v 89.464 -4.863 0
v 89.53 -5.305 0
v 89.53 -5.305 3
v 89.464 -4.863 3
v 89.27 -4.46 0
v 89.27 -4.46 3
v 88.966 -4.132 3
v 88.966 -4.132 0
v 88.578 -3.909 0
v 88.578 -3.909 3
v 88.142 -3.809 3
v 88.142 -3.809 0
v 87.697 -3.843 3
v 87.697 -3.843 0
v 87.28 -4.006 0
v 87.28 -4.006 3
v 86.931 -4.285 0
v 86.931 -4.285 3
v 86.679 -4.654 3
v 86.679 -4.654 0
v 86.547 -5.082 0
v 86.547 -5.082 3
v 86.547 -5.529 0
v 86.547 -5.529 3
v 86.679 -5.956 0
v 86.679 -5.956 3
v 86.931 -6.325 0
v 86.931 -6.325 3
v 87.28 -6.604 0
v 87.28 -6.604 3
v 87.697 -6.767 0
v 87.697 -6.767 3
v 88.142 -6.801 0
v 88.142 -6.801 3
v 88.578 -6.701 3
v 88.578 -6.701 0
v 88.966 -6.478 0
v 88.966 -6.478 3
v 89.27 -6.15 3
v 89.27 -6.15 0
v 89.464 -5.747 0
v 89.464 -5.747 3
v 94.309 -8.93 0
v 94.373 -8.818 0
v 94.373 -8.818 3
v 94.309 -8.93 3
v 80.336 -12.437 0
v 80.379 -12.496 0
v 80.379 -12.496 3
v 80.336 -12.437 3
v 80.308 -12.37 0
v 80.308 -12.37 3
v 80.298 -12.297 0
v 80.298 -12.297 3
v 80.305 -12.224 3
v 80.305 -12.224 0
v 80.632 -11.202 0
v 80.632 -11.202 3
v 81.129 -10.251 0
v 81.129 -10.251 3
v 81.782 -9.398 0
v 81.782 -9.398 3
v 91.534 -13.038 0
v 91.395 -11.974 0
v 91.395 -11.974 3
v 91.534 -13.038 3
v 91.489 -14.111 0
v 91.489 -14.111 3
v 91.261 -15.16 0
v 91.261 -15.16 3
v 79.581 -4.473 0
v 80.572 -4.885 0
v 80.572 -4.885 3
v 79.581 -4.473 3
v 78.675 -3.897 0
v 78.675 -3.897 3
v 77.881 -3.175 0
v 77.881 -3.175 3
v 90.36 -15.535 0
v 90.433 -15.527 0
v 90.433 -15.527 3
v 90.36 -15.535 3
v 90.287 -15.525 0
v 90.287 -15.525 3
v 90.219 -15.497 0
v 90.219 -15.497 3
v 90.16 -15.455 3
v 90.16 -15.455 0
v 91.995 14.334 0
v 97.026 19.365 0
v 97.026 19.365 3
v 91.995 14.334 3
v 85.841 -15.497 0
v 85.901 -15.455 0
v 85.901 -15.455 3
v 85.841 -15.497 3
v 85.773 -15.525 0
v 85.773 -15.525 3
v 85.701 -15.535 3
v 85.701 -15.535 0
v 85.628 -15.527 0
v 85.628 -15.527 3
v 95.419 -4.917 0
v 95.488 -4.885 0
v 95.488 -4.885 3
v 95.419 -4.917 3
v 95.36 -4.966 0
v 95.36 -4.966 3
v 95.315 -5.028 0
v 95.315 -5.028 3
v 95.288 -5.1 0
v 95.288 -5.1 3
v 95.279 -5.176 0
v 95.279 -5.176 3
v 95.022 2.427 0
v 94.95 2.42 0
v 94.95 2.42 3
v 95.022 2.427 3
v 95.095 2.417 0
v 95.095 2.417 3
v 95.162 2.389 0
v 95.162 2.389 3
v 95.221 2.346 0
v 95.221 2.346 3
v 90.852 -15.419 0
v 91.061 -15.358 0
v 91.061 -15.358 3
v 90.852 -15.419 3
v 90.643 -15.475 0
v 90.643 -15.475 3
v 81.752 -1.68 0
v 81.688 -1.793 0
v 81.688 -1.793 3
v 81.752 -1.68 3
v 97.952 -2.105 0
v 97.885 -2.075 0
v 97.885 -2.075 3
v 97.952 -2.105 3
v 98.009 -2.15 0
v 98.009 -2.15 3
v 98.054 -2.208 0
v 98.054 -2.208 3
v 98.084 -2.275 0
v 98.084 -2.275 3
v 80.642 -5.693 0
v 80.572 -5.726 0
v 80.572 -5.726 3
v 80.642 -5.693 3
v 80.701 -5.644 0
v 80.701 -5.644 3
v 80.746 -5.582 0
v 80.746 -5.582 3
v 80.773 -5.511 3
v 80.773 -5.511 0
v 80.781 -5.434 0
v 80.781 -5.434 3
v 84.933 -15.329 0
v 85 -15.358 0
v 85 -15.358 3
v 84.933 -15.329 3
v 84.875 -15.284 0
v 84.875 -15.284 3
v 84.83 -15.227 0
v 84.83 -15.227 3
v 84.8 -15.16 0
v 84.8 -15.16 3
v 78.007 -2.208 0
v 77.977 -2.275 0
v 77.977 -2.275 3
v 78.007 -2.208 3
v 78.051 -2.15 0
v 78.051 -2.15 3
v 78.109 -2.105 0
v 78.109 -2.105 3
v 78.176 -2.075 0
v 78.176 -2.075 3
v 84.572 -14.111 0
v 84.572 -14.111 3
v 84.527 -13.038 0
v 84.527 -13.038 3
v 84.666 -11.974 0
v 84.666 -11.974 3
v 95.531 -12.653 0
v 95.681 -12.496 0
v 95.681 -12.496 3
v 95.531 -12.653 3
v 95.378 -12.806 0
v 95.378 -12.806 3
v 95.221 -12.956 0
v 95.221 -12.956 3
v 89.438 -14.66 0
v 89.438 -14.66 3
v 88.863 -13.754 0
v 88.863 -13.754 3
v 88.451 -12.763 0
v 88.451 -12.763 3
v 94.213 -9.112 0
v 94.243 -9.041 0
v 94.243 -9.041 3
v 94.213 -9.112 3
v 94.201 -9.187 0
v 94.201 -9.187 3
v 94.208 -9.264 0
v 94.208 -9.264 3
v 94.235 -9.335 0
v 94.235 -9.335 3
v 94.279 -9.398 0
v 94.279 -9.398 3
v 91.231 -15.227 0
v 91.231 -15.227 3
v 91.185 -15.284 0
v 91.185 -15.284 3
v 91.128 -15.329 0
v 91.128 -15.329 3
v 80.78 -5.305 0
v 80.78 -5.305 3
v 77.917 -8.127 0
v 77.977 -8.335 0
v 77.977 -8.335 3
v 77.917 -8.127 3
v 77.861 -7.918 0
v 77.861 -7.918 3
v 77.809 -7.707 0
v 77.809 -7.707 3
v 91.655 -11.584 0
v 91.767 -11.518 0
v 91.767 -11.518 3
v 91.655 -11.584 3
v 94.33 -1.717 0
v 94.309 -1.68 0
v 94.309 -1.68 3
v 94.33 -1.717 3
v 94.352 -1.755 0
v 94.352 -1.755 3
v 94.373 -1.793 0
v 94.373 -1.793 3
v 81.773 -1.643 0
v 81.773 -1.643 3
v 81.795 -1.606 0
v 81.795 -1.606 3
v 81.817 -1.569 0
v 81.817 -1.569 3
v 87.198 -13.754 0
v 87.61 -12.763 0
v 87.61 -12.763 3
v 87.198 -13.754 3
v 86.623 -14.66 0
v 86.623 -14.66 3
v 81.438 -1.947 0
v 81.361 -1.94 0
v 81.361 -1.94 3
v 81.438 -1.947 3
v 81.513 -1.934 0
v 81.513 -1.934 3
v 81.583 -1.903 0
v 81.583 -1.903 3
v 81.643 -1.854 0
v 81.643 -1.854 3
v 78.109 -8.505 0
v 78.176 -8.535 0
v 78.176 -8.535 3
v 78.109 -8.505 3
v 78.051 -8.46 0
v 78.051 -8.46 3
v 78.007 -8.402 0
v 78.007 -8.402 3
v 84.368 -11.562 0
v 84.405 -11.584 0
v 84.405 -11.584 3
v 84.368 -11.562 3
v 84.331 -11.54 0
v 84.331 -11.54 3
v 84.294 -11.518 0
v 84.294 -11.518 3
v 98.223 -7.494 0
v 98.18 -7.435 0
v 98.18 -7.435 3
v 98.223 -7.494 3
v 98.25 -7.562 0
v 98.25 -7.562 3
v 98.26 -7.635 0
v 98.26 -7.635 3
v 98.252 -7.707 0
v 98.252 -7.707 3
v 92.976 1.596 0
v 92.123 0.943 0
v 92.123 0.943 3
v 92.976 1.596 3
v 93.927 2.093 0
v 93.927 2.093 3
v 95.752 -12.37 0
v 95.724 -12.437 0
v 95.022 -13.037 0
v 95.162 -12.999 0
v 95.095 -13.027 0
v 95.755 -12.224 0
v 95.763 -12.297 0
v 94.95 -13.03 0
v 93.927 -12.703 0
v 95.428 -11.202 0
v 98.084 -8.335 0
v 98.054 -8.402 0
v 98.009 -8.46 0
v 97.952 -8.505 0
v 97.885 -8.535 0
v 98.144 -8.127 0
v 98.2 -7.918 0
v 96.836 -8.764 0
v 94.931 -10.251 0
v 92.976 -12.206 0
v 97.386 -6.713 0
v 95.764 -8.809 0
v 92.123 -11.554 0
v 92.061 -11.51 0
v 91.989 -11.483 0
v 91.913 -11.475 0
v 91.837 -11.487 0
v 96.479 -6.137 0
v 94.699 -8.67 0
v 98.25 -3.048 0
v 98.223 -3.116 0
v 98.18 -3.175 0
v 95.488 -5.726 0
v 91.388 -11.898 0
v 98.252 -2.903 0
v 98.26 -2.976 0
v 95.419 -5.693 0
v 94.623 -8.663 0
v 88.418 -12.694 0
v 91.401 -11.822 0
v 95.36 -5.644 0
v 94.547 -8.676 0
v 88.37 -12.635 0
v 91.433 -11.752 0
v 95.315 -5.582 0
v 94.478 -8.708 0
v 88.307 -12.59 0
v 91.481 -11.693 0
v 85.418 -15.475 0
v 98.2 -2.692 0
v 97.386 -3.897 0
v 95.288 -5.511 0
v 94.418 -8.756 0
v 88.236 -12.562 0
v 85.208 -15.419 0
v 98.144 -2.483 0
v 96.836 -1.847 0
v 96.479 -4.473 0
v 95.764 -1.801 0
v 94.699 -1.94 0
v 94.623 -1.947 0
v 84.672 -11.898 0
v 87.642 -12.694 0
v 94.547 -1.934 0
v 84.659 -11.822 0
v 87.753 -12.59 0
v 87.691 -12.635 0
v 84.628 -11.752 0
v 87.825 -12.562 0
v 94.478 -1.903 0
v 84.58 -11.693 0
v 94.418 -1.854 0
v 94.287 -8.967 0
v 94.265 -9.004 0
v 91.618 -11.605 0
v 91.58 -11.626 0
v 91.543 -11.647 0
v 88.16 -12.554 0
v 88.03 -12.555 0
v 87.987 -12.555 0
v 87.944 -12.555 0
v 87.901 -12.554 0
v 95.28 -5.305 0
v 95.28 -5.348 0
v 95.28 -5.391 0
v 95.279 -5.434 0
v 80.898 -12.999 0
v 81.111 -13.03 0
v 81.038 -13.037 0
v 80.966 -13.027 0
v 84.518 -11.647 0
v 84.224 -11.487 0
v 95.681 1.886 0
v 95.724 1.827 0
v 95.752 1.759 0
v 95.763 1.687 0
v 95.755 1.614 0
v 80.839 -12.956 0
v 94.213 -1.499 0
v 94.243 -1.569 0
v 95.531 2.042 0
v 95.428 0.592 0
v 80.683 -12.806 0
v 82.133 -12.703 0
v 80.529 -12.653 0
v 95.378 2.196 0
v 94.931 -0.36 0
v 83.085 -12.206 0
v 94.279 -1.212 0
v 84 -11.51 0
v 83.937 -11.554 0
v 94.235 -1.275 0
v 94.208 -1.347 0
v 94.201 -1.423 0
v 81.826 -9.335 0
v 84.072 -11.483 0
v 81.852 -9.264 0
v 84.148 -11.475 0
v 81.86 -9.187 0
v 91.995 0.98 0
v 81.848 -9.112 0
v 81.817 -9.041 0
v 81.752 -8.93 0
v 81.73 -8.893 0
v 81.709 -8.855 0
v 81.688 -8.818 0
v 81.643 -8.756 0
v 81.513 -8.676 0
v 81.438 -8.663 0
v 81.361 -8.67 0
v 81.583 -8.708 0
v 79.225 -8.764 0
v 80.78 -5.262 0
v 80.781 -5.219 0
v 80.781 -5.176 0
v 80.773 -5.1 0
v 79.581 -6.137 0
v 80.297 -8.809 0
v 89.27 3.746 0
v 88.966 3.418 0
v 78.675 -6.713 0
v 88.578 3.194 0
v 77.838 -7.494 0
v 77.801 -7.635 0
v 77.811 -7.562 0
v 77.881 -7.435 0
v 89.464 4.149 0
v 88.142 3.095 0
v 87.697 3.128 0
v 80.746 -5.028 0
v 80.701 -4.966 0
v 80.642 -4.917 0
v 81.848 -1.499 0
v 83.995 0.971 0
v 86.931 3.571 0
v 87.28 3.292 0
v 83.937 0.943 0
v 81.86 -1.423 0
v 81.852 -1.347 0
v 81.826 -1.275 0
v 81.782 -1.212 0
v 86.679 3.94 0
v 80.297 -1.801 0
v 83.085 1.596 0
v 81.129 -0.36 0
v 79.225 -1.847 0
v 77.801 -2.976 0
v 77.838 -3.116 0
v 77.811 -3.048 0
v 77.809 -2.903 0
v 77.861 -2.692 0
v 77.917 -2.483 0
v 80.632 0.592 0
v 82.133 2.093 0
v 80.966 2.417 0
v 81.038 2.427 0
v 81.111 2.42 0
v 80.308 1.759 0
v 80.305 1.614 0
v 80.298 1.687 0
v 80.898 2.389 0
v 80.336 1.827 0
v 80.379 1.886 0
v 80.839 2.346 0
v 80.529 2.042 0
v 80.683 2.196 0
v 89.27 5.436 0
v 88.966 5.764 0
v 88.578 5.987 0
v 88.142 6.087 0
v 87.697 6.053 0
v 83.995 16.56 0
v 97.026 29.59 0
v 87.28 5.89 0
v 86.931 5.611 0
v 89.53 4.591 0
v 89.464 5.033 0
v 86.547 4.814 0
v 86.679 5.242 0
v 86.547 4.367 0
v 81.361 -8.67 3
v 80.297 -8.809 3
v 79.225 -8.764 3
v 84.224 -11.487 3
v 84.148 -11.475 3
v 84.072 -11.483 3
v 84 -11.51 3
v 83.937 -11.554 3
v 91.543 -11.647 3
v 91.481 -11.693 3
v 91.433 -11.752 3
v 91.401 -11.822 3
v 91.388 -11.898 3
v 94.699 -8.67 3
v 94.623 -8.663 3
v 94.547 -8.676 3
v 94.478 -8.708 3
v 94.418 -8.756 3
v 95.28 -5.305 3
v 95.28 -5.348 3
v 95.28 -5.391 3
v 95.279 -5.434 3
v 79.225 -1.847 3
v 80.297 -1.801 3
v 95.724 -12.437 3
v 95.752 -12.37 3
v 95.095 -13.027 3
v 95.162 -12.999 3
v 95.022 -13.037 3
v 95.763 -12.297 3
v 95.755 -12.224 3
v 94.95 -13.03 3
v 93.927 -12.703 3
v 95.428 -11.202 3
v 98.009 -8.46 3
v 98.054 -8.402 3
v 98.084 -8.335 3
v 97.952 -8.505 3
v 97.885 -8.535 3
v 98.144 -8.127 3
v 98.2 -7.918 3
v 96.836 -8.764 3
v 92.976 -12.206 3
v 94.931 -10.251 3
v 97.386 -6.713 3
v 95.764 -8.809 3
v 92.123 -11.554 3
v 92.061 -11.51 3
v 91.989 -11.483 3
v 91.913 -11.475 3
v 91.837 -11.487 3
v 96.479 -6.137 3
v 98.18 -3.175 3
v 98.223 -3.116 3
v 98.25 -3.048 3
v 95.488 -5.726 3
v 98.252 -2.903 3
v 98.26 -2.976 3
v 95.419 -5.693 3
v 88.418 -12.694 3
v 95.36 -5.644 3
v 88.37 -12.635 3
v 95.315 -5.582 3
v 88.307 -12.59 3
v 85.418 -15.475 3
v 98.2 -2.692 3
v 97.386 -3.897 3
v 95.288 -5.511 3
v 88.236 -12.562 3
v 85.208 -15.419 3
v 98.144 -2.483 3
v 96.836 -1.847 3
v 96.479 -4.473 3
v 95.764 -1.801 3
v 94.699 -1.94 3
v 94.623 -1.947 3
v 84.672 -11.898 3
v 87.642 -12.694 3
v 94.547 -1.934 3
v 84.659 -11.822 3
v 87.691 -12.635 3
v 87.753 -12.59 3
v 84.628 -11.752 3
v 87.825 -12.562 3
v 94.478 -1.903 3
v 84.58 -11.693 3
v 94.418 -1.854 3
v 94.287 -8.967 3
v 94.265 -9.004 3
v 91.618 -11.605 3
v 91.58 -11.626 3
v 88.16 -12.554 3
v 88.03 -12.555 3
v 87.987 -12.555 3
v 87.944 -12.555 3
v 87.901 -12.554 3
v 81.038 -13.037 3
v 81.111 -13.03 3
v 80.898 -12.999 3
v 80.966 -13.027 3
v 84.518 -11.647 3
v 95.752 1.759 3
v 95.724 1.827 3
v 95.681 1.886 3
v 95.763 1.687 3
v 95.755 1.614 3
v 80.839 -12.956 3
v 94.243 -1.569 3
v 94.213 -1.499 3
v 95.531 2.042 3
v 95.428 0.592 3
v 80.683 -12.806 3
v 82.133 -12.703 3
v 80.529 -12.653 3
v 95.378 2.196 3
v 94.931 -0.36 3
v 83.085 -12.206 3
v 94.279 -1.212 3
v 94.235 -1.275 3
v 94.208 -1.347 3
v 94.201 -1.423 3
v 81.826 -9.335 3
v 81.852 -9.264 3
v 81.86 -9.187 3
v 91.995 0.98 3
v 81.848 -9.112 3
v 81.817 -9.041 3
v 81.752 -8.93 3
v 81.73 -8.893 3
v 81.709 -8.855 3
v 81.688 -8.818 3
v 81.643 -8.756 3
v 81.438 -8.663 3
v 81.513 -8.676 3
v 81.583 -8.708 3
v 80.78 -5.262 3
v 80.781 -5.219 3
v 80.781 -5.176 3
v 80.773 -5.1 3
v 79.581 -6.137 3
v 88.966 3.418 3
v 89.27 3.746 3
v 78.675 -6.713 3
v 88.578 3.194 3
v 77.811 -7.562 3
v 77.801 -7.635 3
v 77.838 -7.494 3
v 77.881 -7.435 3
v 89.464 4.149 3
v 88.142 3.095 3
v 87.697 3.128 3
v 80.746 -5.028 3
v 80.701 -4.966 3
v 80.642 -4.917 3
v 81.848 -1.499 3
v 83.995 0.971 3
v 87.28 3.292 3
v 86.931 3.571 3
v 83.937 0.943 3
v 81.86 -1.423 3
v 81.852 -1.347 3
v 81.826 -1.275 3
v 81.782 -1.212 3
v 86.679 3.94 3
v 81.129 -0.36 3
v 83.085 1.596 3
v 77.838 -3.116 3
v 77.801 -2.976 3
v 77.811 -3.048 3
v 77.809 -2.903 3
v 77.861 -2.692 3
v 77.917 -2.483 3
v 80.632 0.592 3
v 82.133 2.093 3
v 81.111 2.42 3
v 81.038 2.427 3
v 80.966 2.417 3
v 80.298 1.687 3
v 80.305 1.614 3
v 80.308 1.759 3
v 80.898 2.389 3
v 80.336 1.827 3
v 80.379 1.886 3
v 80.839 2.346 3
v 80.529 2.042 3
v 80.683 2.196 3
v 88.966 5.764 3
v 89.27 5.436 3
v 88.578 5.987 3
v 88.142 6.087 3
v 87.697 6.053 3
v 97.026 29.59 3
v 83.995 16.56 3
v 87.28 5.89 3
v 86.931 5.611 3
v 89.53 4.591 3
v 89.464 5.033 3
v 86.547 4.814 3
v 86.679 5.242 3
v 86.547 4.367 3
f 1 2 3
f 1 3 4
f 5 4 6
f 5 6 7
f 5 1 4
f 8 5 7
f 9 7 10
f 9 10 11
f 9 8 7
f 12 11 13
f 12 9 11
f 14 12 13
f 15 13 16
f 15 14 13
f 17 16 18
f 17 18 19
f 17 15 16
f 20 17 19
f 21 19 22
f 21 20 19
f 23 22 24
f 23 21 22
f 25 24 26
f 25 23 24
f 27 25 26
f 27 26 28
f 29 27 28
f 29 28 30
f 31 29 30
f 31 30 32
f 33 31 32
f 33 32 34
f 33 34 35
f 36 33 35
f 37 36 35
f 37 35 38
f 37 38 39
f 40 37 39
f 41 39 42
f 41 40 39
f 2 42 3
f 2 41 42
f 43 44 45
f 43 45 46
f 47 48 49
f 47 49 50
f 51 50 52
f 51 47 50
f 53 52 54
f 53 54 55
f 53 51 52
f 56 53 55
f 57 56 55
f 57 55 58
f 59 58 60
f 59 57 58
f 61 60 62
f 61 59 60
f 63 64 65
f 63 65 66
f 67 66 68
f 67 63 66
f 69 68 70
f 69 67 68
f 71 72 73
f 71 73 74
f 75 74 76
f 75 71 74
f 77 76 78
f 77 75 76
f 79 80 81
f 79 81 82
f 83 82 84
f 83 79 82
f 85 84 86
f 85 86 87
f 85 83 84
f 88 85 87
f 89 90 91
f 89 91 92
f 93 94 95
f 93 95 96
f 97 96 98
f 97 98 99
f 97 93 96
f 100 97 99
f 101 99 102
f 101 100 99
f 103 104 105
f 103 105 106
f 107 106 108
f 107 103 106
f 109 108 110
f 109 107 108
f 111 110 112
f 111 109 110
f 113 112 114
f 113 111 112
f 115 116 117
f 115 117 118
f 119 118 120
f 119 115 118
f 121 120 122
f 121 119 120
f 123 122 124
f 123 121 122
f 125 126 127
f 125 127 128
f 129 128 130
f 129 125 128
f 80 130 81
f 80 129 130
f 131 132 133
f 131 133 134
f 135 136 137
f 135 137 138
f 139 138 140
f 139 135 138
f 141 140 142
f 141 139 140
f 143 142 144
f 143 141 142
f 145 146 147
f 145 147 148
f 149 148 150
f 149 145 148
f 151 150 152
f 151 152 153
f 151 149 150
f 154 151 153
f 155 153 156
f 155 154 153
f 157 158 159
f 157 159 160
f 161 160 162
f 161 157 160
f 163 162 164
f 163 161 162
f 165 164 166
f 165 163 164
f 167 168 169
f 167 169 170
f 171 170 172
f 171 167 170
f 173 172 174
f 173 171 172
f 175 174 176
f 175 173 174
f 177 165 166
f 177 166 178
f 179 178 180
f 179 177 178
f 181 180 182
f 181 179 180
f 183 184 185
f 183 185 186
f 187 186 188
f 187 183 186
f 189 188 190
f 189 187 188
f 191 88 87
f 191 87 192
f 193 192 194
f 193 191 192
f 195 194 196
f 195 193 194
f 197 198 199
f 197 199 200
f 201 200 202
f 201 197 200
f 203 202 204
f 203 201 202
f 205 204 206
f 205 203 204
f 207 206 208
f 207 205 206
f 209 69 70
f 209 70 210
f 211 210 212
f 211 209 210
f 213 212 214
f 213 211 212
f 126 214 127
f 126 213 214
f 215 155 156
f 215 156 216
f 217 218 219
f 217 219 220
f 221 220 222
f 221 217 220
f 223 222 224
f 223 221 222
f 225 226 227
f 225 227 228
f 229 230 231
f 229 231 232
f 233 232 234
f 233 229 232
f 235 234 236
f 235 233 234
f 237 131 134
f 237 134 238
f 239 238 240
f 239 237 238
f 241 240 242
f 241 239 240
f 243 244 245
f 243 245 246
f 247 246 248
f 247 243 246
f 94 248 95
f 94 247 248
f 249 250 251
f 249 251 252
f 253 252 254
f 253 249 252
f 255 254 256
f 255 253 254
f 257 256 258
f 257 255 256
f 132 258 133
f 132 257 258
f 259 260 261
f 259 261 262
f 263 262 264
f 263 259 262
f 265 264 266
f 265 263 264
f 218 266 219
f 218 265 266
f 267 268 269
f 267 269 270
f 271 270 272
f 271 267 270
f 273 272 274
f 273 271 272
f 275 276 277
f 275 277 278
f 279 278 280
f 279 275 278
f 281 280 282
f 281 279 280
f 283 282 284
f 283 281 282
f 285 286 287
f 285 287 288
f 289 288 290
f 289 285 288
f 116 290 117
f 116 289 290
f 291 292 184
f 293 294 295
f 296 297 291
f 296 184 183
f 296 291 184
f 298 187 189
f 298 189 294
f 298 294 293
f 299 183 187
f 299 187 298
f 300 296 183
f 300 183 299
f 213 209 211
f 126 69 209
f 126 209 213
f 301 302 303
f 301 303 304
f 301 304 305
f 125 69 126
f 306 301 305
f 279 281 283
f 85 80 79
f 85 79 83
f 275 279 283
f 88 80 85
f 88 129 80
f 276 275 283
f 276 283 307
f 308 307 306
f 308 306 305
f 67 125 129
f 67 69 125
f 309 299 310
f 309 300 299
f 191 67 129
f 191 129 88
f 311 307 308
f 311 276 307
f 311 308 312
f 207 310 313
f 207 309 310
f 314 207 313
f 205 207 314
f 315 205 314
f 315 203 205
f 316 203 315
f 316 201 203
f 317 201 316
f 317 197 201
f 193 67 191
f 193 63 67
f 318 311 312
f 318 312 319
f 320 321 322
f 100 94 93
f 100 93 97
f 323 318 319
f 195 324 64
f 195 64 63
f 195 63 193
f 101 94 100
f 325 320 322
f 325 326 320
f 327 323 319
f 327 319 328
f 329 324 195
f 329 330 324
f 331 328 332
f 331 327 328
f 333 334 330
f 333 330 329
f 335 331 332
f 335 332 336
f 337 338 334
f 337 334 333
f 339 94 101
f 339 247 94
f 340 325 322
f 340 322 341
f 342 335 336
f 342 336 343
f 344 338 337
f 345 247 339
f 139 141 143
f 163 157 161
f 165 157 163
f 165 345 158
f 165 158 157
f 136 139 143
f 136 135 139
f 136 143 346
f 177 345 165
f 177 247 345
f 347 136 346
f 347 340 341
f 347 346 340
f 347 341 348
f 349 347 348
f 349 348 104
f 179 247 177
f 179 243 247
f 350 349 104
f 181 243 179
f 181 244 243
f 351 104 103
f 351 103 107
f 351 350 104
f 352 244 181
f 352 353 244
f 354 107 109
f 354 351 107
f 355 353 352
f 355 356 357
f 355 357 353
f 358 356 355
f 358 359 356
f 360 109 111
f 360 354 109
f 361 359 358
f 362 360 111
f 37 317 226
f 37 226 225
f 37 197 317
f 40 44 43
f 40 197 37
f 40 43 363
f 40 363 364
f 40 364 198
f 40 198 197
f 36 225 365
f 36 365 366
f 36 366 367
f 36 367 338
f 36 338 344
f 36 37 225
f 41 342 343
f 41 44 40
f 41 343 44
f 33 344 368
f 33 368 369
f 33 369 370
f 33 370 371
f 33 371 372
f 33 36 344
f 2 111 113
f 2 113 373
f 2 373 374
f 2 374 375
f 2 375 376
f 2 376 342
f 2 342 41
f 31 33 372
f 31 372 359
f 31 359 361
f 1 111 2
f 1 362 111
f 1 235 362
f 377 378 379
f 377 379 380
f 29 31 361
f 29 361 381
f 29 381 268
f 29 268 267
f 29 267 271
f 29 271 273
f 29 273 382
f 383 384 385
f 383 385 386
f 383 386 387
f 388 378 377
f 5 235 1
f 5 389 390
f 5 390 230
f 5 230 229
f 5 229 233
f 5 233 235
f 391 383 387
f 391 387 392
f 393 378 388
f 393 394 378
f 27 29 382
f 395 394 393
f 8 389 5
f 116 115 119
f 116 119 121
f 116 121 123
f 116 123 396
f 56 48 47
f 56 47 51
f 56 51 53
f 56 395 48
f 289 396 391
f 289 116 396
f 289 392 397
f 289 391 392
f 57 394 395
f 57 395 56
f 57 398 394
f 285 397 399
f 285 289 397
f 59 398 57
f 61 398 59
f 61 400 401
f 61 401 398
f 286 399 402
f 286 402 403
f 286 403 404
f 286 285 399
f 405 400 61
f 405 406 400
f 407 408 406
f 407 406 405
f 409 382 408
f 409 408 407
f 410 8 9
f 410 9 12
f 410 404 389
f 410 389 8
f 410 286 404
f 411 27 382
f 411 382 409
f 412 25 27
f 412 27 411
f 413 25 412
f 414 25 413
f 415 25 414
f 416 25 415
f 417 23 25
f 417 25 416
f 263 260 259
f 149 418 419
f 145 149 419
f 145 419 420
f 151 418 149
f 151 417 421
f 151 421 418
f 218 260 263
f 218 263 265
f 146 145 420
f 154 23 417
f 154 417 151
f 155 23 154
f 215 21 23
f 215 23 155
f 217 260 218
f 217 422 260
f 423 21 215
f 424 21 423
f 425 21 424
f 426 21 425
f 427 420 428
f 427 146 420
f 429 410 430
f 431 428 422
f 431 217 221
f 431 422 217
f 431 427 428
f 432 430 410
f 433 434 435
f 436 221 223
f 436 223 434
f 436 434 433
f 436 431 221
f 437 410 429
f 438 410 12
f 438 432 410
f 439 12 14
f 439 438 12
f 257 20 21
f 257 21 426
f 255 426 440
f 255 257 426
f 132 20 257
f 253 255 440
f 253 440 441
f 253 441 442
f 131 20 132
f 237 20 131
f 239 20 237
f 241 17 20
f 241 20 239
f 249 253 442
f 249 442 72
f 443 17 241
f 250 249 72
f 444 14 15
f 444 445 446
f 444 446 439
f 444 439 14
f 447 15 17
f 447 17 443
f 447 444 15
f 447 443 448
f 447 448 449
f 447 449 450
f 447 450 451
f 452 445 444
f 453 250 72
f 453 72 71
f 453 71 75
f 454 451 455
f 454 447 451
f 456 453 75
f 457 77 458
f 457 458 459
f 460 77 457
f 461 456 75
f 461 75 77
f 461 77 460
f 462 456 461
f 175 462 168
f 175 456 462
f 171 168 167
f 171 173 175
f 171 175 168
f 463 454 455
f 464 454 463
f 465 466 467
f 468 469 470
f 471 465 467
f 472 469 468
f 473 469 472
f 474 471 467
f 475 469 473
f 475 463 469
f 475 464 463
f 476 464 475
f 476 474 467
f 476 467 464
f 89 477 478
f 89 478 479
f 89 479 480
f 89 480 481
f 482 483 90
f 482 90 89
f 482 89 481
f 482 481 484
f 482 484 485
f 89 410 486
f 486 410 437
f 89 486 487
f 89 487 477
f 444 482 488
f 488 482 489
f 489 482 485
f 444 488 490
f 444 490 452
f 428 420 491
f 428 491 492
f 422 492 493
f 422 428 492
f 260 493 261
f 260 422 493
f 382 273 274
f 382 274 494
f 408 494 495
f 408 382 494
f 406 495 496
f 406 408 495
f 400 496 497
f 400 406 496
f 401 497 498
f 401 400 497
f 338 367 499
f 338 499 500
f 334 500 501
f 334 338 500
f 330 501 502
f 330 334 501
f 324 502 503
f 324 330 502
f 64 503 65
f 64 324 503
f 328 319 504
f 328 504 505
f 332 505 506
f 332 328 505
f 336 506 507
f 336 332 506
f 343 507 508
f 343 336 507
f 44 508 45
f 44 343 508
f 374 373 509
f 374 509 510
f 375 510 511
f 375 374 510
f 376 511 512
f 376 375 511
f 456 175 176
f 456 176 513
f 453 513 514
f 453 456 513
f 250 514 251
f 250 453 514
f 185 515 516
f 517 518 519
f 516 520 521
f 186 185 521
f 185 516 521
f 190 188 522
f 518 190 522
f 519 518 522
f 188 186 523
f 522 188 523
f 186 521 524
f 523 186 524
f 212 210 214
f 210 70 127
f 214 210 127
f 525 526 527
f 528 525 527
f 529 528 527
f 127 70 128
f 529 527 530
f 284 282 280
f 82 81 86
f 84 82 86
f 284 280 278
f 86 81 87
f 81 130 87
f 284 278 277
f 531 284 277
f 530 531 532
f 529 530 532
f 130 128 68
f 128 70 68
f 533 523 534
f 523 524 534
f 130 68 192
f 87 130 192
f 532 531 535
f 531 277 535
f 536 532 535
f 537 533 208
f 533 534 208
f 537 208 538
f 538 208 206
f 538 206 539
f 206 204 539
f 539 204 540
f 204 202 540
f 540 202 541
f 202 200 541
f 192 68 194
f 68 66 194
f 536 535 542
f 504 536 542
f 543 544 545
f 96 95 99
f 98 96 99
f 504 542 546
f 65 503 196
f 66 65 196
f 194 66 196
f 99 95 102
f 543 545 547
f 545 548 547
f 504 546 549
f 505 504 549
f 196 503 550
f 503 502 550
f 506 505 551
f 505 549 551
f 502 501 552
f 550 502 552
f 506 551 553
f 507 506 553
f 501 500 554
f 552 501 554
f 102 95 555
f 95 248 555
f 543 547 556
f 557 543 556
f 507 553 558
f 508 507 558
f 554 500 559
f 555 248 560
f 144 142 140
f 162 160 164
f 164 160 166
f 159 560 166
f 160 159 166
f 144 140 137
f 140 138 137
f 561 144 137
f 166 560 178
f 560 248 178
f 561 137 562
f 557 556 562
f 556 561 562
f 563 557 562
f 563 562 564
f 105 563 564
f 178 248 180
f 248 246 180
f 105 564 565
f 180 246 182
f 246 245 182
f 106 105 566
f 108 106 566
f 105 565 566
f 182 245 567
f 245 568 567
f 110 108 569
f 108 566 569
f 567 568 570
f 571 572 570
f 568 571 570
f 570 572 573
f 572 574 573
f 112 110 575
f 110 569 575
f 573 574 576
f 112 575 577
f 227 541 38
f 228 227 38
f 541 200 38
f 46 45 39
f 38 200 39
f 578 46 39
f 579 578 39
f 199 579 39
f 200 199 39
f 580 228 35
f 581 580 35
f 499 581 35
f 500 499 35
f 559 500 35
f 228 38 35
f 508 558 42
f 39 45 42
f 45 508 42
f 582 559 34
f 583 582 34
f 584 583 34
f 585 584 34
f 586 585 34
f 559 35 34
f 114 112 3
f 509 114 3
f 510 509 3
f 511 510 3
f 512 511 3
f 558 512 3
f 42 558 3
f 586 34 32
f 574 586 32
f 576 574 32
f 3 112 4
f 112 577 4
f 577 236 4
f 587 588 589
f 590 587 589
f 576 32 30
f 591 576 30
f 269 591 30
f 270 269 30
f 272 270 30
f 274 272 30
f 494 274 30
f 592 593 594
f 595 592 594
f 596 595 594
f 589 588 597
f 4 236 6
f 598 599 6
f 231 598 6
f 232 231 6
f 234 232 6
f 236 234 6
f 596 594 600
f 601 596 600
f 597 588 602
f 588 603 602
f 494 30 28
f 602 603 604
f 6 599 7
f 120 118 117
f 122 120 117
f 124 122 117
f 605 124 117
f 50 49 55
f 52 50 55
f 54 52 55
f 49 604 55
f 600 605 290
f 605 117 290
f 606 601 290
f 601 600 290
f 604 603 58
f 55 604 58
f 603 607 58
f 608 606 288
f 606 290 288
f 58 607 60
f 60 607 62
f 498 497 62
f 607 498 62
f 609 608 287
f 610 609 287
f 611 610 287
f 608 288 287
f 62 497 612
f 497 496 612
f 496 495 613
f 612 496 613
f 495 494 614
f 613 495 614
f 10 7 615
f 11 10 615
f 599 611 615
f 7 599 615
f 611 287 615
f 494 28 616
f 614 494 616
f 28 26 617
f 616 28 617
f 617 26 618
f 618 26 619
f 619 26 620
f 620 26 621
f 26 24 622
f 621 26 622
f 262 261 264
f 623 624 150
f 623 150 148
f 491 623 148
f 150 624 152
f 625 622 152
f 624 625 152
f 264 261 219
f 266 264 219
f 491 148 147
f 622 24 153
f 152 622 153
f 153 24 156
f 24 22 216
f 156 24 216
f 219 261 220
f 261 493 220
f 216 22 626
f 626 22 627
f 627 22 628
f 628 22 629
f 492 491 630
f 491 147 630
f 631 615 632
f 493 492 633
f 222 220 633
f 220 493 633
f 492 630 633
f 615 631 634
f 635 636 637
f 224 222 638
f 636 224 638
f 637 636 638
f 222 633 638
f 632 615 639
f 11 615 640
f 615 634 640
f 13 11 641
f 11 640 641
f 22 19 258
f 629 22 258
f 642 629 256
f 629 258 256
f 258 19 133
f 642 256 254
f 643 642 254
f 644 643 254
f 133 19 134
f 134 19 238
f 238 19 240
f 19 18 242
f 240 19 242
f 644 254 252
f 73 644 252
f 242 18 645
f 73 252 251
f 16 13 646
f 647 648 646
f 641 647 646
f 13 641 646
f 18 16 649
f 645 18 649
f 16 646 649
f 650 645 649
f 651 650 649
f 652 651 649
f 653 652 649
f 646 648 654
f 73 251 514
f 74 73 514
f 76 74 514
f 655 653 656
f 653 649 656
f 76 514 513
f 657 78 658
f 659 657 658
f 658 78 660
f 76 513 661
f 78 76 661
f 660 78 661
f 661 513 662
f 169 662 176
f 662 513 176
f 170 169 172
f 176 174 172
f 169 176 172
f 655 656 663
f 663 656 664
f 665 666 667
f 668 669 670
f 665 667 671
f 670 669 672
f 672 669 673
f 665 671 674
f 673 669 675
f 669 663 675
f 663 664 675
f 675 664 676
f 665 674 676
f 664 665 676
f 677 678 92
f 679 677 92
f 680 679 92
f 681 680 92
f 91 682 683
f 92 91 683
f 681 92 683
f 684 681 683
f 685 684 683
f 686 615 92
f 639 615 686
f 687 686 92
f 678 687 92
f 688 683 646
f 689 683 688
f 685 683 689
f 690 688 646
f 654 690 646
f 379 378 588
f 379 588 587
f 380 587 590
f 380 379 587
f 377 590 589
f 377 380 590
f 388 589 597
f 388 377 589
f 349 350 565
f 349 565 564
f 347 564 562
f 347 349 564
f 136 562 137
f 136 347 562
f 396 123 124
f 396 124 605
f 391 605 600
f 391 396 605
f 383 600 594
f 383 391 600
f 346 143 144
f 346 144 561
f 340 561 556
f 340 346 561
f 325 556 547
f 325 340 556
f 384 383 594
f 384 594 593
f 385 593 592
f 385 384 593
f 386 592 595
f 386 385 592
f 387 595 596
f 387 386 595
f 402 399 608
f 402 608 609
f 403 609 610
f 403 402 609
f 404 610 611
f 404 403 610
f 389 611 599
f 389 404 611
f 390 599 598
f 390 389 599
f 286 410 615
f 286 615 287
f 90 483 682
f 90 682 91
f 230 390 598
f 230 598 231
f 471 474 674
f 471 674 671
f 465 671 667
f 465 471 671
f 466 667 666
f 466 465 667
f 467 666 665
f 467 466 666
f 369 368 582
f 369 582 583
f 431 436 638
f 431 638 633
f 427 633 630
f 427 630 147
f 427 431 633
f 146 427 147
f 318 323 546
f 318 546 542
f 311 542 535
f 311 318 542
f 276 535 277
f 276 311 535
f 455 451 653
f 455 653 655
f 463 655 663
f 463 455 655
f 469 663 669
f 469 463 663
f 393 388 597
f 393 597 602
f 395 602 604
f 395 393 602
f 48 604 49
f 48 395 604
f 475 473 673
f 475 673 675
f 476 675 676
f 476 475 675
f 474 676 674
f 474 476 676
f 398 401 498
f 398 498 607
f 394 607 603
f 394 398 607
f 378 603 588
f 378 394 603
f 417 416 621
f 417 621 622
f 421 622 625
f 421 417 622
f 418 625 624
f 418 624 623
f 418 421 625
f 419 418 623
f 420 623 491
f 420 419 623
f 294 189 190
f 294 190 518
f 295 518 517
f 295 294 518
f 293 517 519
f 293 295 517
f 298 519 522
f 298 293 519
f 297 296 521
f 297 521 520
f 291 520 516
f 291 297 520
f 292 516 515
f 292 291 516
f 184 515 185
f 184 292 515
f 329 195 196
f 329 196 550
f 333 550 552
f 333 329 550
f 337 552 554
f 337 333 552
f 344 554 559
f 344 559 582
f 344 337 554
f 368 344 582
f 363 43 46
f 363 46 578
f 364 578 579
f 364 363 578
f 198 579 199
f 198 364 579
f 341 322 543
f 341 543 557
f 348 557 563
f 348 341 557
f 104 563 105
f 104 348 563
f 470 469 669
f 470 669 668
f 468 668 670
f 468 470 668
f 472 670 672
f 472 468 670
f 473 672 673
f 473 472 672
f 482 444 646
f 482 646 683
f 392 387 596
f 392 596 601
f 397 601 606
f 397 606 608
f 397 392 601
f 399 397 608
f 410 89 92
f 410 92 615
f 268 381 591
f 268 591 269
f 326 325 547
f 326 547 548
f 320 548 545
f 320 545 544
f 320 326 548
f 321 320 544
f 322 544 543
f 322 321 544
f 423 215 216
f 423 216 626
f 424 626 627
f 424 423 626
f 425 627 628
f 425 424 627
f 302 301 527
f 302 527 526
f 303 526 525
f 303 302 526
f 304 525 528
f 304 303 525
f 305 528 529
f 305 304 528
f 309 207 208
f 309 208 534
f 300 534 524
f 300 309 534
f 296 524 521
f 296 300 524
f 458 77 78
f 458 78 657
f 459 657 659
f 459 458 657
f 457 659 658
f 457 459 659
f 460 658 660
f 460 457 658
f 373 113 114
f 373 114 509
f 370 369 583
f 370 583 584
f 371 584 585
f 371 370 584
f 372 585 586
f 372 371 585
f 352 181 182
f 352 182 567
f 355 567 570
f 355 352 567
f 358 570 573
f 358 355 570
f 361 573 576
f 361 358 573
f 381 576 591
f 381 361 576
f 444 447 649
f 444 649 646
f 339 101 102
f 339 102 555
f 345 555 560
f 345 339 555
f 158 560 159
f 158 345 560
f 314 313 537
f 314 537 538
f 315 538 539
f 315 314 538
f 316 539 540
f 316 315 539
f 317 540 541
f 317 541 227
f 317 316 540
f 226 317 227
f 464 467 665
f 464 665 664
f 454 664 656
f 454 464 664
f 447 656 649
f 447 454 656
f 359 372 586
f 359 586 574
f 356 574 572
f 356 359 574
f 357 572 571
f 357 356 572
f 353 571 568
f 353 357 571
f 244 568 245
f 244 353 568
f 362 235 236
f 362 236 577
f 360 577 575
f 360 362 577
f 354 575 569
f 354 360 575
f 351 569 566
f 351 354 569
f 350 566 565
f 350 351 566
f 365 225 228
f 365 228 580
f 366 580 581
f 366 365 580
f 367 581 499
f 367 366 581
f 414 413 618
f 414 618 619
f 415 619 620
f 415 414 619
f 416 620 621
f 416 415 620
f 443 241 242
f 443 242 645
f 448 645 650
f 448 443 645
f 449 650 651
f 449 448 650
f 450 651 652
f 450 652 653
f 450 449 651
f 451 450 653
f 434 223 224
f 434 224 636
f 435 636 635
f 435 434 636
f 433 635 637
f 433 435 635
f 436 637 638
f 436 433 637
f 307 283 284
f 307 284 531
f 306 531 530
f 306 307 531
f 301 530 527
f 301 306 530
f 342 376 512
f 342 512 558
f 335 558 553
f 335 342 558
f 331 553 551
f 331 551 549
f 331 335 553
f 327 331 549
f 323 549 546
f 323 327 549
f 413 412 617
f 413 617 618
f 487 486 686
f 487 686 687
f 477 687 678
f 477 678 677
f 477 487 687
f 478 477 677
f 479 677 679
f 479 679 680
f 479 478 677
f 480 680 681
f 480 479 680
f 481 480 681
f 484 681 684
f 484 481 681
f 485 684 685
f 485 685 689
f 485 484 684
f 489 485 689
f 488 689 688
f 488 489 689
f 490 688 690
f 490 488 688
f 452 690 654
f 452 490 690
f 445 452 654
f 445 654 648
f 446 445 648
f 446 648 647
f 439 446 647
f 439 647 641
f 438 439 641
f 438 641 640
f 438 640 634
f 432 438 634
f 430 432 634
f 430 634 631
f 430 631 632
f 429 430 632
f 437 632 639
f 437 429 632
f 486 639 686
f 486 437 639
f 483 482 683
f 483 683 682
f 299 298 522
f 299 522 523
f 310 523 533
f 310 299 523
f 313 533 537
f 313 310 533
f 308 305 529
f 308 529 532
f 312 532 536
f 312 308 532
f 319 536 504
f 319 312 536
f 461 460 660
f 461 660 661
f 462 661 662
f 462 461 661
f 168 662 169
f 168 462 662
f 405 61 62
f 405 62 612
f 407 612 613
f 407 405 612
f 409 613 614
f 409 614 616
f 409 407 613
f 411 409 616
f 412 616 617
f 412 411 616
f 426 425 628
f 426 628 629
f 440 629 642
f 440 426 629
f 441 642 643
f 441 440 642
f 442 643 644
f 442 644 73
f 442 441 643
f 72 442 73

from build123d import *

# Parameters (mm, degrees)
ESQUISSE18_R        = 1.5
BOSS_EXTRU_18_DEPTH = 3


with BuildPart() as part:
    # Esquisse18 → Boss.-Extru.18 (new body)
    with BuildSketch(Plane.XY):
        with BuildLine():
            Line((83.995271076, 16.559954608), (97.025632531, 29.590316063))
            Line((97.025632531, 29.590316063), (97.025632531, 19.364814746))
            Line((97.025632531, 19.364814746), (91.995271076, 14.334453291))
            Line((91.995271076, 14.334453291), (91.995271076, 0.979857371))
            Line((91.995271076, 0.979857371), (92.123404239, 0.943388643))
            ThreePointArc((92.123404239, 0.943388643), (93.440738996, 1.864842376), (94.949542599, 2.419783395))
            ThreePointArc((94.949542599, 2.419783395), (95.094740148, 2.416733928), (95.221491727, 2.345842004))
            ThreePointArc((95.221491727, 2.345842004), (95.454932198, 2.119520802), (95.6812534, 1.886080331))
            ThreePointArc((95.6812534, 1.886080331), (95.752145324, 1.759328753), (95.755194791, 1.614131203))
            ThreePointArc((95.755194791, 1.614131203), (95.200253772, 0.1053276), (94.278800038, -1.212007157))
            ThreePointArc((94.278800038, -1.212007157), (94.201940613, -1.384508915), (94.243380312, -1.568755975))
            Line((94.243380312, -1.568755975), (94.308995173, -1.680100401))
            ThreePointArc((94.308995173, -1.680100401), (94.341055685, -1.73620681), (94.372614843, -1.792596749))
            ThreePointArc((94.372614843, -1.792596749), (94.511457628, -1.920608112), (94.699278246, -1.940296776))
            ThreePointArc((94.699278246, -1.940296776), (96.300850478, -1.800961813), (97.884983236, -2.074770594))
            ThreePointArc((97.884983236, -2.074770594), (98.009203269, -2.150010285), (98.083527395, -2.274780281))
            ThreePointArc((98.083527395, -2.274780281), (98.172532171, -2.587500427), (98.251811846, -2.902826406))
            ThreePointArc((98.251811846, -2.902826406), (98.249830264, -3.048042455), (98.179872405, -3.175311955))
            ThreePointArc((98.179872405, -3.175311955), (96.944877584, -4.204503695), (95.488207864, -4.884622193))
            ThreePointArc((95.488207864, -4.884622193), (95.33539477, -4.995583385), (95.279159072, -5.175865869))
            Line((95.279159072, -5.175865869), (95.280310995, -5.305100401))
            ThreePointArc((95.280310995, -5.305100401), (95.280023009, -5.369720233), (95.279159072, -5.434334932))
            ThreePointArc((95.279159072, -5.434334932), (95.33539477, -5.614617416), (95.488207864, -5.725578608))
            ThreePointArc((95.488207864, -5.725578608), (96.944877584, -6.405697106), (98.179872405, -7.434888846))
            ThreePointArc((98.179872405, -7.434888846), (98.249830264, -7.562158346), (98.251811846, -7.707374395))
            ThreePointArc((98.251811846, -7.707374395), (98.172532171, -8.022700374), (98.083527395, -8.33542052))
            ThreePointArc((98.083527395, -8.33542052), (98.009203269, -8.460190516), (97.884983236, -8.535430207))
            ThreePointArc((97.884983236, -8.535430207), (96.300850478, -8.809238989), (94.699278246, -8.669904025))
            ThreePointArc((94.699278246, -8.669904025), (94.511457628, -8.68959269), (94.372614843, -8.817604052))
            Line((94.372614843, -8.817604052), (94.308995173, -8.930100401))
            ThreePointArc((94.308995173, -8.930100401), (94.276435853, -8.985918824), (94.243380312, -9.041444826))
            ThreePointArc((94.243380312, -9.041444826), (94.201940613, -9.225691886), (94.278800038, -9.398193644))
            ThreePointArc((94.278800038, -9.398193644), (95.200253772, -10.715528401), (95.755194791, -12.224332004))
            ThreePointArc((95.755194791, -12.224332004), (95.752145324, -12.369529554), (95.6812534, -12.496281132))
            ThreePointArc((95.6812534, -12.496281132), (95.454932198, -12.729721603), (95.221491727, -12.956042805))
            ThreePointArc((95.221491727, -12.956042805), (95.094740148, -13.026934729), (94.949542599, -13.029984196))
            ThreePointArc((94.949542599, -13.029984196), (93.440738996, -12.475043177), (92.123404239, -11.553589444))
            ThreePointArc((92.123404239, -11.553589444), (91.950902481, -11.476730018), (91.76665542, -11.518169717))
            Line((91.76665542, -11.518169717), (91.655310995, -11.583784578))
            ThreePointArc((91.655310995, -11.583784578), (91.599204585, -11.61584509), (91.542814646, -11.647404249))
            ThreePointArc((91.542814646, -11.647404249), (91.414803284, -11.786247034), (91.39511462, -11.974067651))
            ThreePointArc((91.39511462, -11.974067651), (91.534449583, -13.575639883), (91.260640801, -15.159772642))
            ThreePointArc((91.260640801, -15.159772642), (91.185401111, -15.283992675), (91.060631115, -15.3583168))
            ThreePointArc((91.060631115, -15.3583168), (90.747910969, -15.447321577), (90.43258499, -15.526601252))
            ThreePointArc((90.43258499, -15.526601252), (90.287368941, -15.52461967), (90.160099441, -15.454661811))
            ThreePointArc((90.160099441, -15.454661811), (89.130907701, -14.219666989), (88.450789203, -12.762997269))
            ThreePointArc((88.450789203, -12.762997269), (88.339828011, -12.610184175), (88.159545526, -12.553948477))
            Line((88.159545526, -12.553948477), (88.030310995, -12.555100401))
            ThreePointArc((88.030310995, -12.555100401), (87.965691163, -12.554812414), (87.901076464, -12.553948477))
            ThreePointArc((87.901076464, -12.553948477), (87.72079398, -12.610184175), (87.609832788, -12.762997269))
            ThreePointArc((87.609832788, -12.762997269), (86.929714289, -14.219666989), (85.900522549, -15.454661811))
            ThreePointArc((85.900522549, -15.454661811), (85.77325305, -15.52461967), (85.628037, -15.526601252))
            ThreePointArc((85.628037, -15.526601252), (85.312711022, -15.447321577), (84.999990876, -15.3583168))
            ThreePointArc((84.999990876, -15.3583168), (84.875220879, -15.283992675), (84.799981189, -15.159772642))
            ThreePointArc((84.799981189, -15.159772642), (84.526172407, -13.575639883), (84.66550737, -11.974067651))
            ThreePointArc((84.66550737, -11.974067651), (84.645818706, -11.786247034), (84.517807344, -11.647404249))
            Line((84.517807344, -11.647404249), (84.405310995, -11.583784578))
            ThreePointArc((84.405310995, -11.583784578), (84.349492572, -11.551225258), (84.29396657, -11.518169717))
            ThreePointArc((84.29396657, -11.518169717), (84.10971951, -11.476730018), (83.937217751, -11.553589444))
            ThreePointArc((83.937217751, -11.553589444), (82.619882994, -12.475043177), (81.111079391, -13.029984196))
            ThreePointArc((81.111079391, -13.029984196), (80.965881842, -13.026934729), (80.839130263, -12.956042805))
            ThreePointArc((80.839130263, -12.956042805), (80.605689793, -12.729721603), (80.37936859, -12.496281132))
            ThreePointArc((80.37936859, -12.496281132), (80.308476666, -12.369529554), (80.3054272, -12.224332004))
            ThreePointArc((80.3054272, -12.224332004), (80.860368218, -10.715528401), (81.781821952, -9.398193644))
            ThreePointArc((81.781821952, -9.398193644), (81.858681377, -9.225691886), (81.817241678, -9.041444826))
            Line((81.817241678, -9.041444826), (81.751626818, -8.930100401))
            ThreePointArc((81.751626818, -8.930100401), (81.719566305, -8.873993991), (81.688007147, -8.817604052))
            ThreePointArc((81.688007147, -8.817604052), (81.549164362, -8.68959269), (81.361343744, -8.669904025))
            ThreePointArc((81.361343744, -8.669904025), (79.759771513, -8.809238989), (78.175638754, -8.535430207))
            ThreePointArc((78.175638754, -8.535430207), (78.051418721, -8.460190516), (77.977094596, -8.33542052))
            ThreePointArc((77.977094596, -8.33542052), (77.888089819, -8.022700374), (77.808810144, -7.707374395))
            ThreePointArc((77.808810144, -7.707374395), (77.810791726, -7.562158346), (77.880749585, -7.434888846))
            ThreePointArc((77.880749585, -7.434888846), (79.115744406, -6.405697106), (80.572414127, -5.725578608))
            ThreePointArc((80.572414127, -5.725578608), (80.725227221, -5.614617416), (80.781462919, -5.434334932))
            Line((80.781462919, -5.434334932), (80.780310995, -5.305100401))
            ThreePointArc((80.780310995, -5.305100401), (80.780598982, -5.240480568), (80.781462919, -5.175865869))
            ThreePointArc((80.781462919, -5.175865869), (80.725227221, -4.995583385), (80.572414127, -4.884622193))
            ThreePointArc((80.572414127, -4.884622193), (79.115744406, -4.204503695), (77.880749585, -3.175311955))
            ThreePointArc((77.880749585, -3.175311955), (77.810791726, -3.048042455), (77.808810144, -2.902826406))
            ThreePointArc((77.808810144, -2.902826406), (77.888089819, -2.587500427), (77.977094596, -2.274780281))
            ThreePointArc((77.977094596, -2.274780281), (78.051418721, -2.150010285), (78.175638754, -2.074770594))
            ThreePointArc((78.175638754, -2.074770594), (79.759771513, -1.800961813), (81.361343744, -1.940296776))
            ThreePointArc((81.361343744, -1.940296776), (81.549164362, -1.920608112), (81.688007147, -1.792596749))
            Line((81.688007147, -1.792596749), (81.751626818, -1.680100401))
            ThreePointArc((81.751626818, -1.680100401), (81.784186138, -1.624281977), (81.817241678, -1.568755975))
            ThreePointArc((81.817241678, -1.568755975), (81.858681377, -1.384508915), (81.781821952, -1.212007157))
            ThreePointArc((81.781821952, -1.212007157), (80.860368218, 0.1053276), (80.3054272, 1.614131203))
            ThreePointArc((80.3054272, 1.614131203), (80.308476666, 1.759328753), (80.37936859, 1.886080331))
            ThreePointArc((80.37936859, 1.886080331), (80.605689793, 2.119520802), (80.839130263, 2.345842004))
            ThreePointArc((80.839130263, 2.345842004), (80.965881842, 2.416733928), (81.111079391, 2.419783395))
            ThreePointArc((81.111079391, 2.419783395), (82.619882994, 1.864842376), (83.937217751, 0.943388643))
            Line((83.937217751, 0.943388643), (83.995271076, 0.970909453))
            Line((83.995271076, 0.970909453), (83.995271076, 16.559954608))
        make_face()
        with Locations((88.030310995, -5.305100401)):
            Circle(ESQUISSE18_R, mode=Mode.SUBTRACT)
        with Locations((88.030310995, 4.590763304)):
            Circle(ESQUISSE18_R, mode=Mode.SUBTRACT)
    extrude(amount=BOSS_EXTRU_18_DEPTH)


solid = part.part
